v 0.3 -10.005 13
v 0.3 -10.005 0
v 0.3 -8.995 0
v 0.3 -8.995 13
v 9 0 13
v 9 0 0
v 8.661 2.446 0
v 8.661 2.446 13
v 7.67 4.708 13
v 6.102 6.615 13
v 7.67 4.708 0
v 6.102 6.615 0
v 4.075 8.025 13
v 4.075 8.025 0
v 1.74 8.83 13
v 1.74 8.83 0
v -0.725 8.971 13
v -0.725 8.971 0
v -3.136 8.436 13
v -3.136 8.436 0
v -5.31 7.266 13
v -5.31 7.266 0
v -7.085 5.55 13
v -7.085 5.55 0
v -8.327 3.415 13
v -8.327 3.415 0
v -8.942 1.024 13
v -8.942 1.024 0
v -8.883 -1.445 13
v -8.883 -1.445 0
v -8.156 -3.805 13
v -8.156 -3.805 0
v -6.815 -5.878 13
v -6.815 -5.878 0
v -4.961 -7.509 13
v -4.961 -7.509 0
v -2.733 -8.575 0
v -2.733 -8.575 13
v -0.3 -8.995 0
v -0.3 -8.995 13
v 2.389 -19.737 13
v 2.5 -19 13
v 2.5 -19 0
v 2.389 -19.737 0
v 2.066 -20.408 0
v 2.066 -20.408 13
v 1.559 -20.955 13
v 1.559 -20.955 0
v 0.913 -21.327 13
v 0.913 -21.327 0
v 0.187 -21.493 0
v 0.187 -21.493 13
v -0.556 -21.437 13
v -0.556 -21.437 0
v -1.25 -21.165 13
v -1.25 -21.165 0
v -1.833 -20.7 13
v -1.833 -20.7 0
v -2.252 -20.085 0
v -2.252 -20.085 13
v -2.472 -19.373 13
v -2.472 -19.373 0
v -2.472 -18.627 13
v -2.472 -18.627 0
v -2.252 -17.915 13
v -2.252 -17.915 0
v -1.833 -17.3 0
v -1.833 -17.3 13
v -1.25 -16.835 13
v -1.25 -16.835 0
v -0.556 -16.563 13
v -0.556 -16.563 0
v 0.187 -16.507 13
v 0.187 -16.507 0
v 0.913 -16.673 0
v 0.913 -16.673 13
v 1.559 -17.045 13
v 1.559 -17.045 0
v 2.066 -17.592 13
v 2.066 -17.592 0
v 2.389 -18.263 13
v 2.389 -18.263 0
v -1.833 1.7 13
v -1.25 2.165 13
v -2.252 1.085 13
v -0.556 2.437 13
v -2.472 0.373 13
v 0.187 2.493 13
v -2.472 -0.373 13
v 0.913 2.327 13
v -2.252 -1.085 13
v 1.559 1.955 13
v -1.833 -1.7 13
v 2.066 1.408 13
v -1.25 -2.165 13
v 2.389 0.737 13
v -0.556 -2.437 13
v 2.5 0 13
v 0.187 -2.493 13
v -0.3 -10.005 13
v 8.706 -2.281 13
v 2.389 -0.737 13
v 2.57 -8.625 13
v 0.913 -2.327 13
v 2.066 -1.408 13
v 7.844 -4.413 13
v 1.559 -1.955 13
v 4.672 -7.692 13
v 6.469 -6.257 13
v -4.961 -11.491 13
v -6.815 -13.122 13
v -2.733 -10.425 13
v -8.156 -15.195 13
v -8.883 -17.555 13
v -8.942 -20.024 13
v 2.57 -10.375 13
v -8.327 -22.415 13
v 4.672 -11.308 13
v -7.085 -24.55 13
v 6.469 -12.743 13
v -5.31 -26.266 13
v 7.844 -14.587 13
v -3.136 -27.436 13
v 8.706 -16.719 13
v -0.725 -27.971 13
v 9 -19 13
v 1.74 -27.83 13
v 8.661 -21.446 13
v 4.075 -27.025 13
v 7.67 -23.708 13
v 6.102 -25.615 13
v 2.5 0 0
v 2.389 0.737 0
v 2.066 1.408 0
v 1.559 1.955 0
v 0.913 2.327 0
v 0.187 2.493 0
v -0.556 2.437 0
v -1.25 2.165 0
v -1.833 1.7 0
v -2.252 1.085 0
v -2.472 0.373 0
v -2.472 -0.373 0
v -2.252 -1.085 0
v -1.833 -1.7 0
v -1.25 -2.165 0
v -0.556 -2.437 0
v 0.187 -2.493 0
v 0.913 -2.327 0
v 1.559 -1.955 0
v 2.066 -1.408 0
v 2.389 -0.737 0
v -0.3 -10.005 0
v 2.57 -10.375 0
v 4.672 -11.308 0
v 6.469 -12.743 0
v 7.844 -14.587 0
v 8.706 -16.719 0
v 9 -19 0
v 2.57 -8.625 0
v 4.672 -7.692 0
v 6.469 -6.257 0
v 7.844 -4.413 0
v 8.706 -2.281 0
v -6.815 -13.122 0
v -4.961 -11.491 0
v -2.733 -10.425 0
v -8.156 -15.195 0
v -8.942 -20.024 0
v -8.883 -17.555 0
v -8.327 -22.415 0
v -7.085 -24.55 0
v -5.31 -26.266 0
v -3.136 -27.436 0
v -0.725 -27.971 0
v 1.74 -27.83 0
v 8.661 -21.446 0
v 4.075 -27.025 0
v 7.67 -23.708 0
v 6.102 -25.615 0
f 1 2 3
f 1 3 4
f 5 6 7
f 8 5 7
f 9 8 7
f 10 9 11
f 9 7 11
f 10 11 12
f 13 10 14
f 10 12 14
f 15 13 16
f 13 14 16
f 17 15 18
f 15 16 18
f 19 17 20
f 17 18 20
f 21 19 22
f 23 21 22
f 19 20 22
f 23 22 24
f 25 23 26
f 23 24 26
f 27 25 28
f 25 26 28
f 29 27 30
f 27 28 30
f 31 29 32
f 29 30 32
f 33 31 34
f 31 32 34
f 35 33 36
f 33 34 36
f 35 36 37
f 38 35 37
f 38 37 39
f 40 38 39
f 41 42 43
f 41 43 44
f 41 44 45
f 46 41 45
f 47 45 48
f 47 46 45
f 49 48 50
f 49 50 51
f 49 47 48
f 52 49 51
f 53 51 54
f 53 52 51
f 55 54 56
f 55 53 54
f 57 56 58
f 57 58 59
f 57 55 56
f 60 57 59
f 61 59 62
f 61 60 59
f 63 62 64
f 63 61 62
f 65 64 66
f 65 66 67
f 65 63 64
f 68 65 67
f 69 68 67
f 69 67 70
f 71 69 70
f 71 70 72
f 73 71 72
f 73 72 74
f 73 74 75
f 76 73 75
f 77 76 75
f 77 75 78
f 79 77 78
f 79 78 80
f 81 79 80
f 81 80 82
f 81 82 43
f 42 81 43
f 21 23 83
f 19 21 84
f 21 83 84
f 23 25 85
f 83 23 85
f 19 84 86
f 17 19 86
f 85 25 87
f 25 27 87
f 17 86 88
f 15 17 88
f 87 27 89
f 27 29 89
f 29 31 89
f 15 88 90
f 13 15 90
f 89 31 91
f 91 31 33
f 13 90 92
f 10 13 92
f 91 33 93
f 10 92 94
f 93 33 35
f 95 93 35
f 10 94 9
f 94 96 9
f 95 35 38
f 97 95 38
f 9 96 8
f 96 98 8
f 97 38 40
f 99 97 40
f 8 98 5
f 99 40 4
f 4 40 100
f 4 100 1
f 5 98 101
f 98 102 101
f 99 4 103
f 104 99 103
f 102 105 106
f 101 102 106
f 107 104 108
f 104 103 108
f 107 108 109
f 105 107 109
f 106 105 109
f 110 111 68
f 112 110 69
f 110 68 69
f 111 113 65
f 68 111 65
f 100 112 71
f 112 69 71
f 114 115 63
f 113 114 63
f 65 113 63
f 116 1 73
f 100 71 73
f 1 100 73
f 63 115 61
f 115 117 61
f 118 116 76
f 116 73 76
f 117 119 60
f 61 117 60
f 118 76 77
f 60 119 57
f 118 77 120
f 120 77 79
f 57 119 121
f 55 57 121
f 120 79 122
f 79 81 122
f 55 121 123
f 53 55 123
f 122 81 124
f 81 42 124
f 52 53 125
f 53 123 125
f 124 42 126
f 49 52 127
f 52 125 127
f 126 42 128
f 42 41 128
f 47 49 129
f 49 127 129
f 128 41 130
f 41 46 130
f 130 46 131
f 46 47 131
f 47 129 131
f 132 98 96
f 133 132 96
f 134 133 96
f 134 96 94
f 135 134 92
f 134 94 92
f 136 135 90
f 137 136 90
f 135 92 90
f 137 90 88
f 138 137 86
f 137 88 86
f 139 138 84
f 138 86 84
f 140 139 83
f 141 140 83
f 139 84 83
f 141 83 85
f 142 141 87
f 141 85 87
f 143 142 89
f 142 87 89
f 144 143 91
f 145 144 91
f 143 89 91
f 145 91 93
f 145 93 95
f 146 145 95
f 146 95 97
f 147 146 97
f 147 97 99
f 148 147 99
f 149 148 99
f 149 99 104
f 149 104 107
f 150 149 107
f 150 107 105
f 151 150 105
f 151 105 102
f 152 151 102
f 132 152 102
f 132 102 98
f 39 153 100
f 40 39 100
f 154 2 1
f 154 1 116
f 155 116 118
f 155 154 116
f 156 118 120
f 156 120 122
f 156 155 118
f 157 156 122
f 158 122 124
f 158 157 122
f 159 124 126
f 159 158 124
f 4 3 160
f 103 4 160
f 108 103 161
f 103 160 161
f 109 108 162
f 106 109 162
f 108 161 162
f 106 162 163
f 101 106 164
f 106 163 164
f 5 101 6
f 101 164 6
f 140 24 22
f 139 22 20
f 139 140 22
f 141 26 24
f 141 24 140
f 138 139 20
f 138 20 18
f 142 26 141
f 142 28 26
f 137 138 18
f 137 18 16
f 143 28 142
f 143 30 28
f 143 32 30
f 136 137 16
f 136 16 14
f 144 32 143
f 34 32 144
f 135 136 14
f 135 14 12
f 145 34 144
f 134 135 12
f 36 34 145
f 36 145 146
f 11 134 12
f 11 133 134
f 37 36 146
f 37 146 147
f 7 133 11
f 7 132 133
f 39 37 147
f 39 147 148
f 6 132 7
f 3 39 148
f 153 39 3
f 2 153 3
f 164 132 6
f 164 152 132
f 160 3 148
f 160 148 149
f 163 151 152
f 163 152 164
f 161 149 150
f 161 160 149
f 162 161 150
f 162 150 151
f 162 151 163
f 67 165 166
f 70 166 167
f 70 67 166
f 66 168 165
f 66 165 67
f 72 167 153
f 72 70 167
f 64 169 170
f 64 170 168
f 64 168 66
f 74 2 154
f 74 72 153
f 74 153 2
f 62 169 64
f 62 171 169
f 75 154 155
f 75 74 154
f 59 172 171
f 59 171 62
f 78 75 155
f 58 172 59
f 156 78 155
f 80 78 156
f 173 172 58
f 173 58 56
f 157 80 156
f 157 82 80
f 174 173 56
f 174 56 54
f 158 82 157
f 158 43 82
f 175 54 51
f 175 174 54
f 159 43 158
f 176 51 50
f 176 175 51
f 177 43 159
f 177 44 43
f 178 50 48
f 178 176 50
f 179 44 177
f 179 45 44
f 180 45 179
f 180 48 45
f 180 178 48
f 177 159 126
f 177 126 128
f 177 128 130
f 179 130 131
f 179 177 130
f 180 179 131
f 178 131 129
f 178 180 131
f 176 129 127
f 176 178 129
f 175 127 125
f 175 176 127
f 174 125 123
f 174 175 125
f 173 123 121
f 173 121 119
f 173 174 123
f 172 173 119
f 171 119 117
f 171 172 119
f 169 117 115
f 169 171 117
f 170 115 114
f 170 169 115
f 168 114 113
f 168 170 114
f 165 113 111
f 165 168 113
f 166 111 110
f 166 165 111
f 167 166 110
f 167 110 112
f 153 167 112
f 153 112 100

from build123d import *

# Parameters (mm, degrees)
F0_R          = 9
F1_DEPTH      = 13
F2_R          = 2.5
F3_DEPTH      = 13.001
F5_W          = 0.6
F5_H          = 13
F7_DEPTH      = 1.5050013897
F7_DEPTH_BACK = 1.5050013897


with BuildPart() as f1:
    # F0 (on Top) → F1 (new body)
    with BuildSketch(Plane.XY):
        Circle(F0_R)
    extrude(amount=F1_DEPTH)

    # F2 (on face) → F3 (cut, through all)
    with BuildSketch(Plane.XY.offset(13)):
        Circle(F2_R)
    extrude(amount=-F3_DEPTH, mode=Mode.SUBTRACT)


with BuildPart() as f6_1:
    # F6: instance of F1
    add(f1.part.mirror(Plane.XZ.offset(9.5)))


with BuildPart() as f1_1:
    add(f1.part)

    add(f6_1.part)  # F7 merges F6_1
    # F5 (on offset) → F7 (join, two sides)
    with BuildSketch(Plane.XZ.offset(9.5)) as f7_sk:
        with Locations((0, 6.5)):
            Rectangle(F5_W, F5_H)
    extrude(amount=F7_DEPTH)
    extrude(f7_sk.sketch, amount=-F7_DEPTH_BACK)


solid = f1_1.part
